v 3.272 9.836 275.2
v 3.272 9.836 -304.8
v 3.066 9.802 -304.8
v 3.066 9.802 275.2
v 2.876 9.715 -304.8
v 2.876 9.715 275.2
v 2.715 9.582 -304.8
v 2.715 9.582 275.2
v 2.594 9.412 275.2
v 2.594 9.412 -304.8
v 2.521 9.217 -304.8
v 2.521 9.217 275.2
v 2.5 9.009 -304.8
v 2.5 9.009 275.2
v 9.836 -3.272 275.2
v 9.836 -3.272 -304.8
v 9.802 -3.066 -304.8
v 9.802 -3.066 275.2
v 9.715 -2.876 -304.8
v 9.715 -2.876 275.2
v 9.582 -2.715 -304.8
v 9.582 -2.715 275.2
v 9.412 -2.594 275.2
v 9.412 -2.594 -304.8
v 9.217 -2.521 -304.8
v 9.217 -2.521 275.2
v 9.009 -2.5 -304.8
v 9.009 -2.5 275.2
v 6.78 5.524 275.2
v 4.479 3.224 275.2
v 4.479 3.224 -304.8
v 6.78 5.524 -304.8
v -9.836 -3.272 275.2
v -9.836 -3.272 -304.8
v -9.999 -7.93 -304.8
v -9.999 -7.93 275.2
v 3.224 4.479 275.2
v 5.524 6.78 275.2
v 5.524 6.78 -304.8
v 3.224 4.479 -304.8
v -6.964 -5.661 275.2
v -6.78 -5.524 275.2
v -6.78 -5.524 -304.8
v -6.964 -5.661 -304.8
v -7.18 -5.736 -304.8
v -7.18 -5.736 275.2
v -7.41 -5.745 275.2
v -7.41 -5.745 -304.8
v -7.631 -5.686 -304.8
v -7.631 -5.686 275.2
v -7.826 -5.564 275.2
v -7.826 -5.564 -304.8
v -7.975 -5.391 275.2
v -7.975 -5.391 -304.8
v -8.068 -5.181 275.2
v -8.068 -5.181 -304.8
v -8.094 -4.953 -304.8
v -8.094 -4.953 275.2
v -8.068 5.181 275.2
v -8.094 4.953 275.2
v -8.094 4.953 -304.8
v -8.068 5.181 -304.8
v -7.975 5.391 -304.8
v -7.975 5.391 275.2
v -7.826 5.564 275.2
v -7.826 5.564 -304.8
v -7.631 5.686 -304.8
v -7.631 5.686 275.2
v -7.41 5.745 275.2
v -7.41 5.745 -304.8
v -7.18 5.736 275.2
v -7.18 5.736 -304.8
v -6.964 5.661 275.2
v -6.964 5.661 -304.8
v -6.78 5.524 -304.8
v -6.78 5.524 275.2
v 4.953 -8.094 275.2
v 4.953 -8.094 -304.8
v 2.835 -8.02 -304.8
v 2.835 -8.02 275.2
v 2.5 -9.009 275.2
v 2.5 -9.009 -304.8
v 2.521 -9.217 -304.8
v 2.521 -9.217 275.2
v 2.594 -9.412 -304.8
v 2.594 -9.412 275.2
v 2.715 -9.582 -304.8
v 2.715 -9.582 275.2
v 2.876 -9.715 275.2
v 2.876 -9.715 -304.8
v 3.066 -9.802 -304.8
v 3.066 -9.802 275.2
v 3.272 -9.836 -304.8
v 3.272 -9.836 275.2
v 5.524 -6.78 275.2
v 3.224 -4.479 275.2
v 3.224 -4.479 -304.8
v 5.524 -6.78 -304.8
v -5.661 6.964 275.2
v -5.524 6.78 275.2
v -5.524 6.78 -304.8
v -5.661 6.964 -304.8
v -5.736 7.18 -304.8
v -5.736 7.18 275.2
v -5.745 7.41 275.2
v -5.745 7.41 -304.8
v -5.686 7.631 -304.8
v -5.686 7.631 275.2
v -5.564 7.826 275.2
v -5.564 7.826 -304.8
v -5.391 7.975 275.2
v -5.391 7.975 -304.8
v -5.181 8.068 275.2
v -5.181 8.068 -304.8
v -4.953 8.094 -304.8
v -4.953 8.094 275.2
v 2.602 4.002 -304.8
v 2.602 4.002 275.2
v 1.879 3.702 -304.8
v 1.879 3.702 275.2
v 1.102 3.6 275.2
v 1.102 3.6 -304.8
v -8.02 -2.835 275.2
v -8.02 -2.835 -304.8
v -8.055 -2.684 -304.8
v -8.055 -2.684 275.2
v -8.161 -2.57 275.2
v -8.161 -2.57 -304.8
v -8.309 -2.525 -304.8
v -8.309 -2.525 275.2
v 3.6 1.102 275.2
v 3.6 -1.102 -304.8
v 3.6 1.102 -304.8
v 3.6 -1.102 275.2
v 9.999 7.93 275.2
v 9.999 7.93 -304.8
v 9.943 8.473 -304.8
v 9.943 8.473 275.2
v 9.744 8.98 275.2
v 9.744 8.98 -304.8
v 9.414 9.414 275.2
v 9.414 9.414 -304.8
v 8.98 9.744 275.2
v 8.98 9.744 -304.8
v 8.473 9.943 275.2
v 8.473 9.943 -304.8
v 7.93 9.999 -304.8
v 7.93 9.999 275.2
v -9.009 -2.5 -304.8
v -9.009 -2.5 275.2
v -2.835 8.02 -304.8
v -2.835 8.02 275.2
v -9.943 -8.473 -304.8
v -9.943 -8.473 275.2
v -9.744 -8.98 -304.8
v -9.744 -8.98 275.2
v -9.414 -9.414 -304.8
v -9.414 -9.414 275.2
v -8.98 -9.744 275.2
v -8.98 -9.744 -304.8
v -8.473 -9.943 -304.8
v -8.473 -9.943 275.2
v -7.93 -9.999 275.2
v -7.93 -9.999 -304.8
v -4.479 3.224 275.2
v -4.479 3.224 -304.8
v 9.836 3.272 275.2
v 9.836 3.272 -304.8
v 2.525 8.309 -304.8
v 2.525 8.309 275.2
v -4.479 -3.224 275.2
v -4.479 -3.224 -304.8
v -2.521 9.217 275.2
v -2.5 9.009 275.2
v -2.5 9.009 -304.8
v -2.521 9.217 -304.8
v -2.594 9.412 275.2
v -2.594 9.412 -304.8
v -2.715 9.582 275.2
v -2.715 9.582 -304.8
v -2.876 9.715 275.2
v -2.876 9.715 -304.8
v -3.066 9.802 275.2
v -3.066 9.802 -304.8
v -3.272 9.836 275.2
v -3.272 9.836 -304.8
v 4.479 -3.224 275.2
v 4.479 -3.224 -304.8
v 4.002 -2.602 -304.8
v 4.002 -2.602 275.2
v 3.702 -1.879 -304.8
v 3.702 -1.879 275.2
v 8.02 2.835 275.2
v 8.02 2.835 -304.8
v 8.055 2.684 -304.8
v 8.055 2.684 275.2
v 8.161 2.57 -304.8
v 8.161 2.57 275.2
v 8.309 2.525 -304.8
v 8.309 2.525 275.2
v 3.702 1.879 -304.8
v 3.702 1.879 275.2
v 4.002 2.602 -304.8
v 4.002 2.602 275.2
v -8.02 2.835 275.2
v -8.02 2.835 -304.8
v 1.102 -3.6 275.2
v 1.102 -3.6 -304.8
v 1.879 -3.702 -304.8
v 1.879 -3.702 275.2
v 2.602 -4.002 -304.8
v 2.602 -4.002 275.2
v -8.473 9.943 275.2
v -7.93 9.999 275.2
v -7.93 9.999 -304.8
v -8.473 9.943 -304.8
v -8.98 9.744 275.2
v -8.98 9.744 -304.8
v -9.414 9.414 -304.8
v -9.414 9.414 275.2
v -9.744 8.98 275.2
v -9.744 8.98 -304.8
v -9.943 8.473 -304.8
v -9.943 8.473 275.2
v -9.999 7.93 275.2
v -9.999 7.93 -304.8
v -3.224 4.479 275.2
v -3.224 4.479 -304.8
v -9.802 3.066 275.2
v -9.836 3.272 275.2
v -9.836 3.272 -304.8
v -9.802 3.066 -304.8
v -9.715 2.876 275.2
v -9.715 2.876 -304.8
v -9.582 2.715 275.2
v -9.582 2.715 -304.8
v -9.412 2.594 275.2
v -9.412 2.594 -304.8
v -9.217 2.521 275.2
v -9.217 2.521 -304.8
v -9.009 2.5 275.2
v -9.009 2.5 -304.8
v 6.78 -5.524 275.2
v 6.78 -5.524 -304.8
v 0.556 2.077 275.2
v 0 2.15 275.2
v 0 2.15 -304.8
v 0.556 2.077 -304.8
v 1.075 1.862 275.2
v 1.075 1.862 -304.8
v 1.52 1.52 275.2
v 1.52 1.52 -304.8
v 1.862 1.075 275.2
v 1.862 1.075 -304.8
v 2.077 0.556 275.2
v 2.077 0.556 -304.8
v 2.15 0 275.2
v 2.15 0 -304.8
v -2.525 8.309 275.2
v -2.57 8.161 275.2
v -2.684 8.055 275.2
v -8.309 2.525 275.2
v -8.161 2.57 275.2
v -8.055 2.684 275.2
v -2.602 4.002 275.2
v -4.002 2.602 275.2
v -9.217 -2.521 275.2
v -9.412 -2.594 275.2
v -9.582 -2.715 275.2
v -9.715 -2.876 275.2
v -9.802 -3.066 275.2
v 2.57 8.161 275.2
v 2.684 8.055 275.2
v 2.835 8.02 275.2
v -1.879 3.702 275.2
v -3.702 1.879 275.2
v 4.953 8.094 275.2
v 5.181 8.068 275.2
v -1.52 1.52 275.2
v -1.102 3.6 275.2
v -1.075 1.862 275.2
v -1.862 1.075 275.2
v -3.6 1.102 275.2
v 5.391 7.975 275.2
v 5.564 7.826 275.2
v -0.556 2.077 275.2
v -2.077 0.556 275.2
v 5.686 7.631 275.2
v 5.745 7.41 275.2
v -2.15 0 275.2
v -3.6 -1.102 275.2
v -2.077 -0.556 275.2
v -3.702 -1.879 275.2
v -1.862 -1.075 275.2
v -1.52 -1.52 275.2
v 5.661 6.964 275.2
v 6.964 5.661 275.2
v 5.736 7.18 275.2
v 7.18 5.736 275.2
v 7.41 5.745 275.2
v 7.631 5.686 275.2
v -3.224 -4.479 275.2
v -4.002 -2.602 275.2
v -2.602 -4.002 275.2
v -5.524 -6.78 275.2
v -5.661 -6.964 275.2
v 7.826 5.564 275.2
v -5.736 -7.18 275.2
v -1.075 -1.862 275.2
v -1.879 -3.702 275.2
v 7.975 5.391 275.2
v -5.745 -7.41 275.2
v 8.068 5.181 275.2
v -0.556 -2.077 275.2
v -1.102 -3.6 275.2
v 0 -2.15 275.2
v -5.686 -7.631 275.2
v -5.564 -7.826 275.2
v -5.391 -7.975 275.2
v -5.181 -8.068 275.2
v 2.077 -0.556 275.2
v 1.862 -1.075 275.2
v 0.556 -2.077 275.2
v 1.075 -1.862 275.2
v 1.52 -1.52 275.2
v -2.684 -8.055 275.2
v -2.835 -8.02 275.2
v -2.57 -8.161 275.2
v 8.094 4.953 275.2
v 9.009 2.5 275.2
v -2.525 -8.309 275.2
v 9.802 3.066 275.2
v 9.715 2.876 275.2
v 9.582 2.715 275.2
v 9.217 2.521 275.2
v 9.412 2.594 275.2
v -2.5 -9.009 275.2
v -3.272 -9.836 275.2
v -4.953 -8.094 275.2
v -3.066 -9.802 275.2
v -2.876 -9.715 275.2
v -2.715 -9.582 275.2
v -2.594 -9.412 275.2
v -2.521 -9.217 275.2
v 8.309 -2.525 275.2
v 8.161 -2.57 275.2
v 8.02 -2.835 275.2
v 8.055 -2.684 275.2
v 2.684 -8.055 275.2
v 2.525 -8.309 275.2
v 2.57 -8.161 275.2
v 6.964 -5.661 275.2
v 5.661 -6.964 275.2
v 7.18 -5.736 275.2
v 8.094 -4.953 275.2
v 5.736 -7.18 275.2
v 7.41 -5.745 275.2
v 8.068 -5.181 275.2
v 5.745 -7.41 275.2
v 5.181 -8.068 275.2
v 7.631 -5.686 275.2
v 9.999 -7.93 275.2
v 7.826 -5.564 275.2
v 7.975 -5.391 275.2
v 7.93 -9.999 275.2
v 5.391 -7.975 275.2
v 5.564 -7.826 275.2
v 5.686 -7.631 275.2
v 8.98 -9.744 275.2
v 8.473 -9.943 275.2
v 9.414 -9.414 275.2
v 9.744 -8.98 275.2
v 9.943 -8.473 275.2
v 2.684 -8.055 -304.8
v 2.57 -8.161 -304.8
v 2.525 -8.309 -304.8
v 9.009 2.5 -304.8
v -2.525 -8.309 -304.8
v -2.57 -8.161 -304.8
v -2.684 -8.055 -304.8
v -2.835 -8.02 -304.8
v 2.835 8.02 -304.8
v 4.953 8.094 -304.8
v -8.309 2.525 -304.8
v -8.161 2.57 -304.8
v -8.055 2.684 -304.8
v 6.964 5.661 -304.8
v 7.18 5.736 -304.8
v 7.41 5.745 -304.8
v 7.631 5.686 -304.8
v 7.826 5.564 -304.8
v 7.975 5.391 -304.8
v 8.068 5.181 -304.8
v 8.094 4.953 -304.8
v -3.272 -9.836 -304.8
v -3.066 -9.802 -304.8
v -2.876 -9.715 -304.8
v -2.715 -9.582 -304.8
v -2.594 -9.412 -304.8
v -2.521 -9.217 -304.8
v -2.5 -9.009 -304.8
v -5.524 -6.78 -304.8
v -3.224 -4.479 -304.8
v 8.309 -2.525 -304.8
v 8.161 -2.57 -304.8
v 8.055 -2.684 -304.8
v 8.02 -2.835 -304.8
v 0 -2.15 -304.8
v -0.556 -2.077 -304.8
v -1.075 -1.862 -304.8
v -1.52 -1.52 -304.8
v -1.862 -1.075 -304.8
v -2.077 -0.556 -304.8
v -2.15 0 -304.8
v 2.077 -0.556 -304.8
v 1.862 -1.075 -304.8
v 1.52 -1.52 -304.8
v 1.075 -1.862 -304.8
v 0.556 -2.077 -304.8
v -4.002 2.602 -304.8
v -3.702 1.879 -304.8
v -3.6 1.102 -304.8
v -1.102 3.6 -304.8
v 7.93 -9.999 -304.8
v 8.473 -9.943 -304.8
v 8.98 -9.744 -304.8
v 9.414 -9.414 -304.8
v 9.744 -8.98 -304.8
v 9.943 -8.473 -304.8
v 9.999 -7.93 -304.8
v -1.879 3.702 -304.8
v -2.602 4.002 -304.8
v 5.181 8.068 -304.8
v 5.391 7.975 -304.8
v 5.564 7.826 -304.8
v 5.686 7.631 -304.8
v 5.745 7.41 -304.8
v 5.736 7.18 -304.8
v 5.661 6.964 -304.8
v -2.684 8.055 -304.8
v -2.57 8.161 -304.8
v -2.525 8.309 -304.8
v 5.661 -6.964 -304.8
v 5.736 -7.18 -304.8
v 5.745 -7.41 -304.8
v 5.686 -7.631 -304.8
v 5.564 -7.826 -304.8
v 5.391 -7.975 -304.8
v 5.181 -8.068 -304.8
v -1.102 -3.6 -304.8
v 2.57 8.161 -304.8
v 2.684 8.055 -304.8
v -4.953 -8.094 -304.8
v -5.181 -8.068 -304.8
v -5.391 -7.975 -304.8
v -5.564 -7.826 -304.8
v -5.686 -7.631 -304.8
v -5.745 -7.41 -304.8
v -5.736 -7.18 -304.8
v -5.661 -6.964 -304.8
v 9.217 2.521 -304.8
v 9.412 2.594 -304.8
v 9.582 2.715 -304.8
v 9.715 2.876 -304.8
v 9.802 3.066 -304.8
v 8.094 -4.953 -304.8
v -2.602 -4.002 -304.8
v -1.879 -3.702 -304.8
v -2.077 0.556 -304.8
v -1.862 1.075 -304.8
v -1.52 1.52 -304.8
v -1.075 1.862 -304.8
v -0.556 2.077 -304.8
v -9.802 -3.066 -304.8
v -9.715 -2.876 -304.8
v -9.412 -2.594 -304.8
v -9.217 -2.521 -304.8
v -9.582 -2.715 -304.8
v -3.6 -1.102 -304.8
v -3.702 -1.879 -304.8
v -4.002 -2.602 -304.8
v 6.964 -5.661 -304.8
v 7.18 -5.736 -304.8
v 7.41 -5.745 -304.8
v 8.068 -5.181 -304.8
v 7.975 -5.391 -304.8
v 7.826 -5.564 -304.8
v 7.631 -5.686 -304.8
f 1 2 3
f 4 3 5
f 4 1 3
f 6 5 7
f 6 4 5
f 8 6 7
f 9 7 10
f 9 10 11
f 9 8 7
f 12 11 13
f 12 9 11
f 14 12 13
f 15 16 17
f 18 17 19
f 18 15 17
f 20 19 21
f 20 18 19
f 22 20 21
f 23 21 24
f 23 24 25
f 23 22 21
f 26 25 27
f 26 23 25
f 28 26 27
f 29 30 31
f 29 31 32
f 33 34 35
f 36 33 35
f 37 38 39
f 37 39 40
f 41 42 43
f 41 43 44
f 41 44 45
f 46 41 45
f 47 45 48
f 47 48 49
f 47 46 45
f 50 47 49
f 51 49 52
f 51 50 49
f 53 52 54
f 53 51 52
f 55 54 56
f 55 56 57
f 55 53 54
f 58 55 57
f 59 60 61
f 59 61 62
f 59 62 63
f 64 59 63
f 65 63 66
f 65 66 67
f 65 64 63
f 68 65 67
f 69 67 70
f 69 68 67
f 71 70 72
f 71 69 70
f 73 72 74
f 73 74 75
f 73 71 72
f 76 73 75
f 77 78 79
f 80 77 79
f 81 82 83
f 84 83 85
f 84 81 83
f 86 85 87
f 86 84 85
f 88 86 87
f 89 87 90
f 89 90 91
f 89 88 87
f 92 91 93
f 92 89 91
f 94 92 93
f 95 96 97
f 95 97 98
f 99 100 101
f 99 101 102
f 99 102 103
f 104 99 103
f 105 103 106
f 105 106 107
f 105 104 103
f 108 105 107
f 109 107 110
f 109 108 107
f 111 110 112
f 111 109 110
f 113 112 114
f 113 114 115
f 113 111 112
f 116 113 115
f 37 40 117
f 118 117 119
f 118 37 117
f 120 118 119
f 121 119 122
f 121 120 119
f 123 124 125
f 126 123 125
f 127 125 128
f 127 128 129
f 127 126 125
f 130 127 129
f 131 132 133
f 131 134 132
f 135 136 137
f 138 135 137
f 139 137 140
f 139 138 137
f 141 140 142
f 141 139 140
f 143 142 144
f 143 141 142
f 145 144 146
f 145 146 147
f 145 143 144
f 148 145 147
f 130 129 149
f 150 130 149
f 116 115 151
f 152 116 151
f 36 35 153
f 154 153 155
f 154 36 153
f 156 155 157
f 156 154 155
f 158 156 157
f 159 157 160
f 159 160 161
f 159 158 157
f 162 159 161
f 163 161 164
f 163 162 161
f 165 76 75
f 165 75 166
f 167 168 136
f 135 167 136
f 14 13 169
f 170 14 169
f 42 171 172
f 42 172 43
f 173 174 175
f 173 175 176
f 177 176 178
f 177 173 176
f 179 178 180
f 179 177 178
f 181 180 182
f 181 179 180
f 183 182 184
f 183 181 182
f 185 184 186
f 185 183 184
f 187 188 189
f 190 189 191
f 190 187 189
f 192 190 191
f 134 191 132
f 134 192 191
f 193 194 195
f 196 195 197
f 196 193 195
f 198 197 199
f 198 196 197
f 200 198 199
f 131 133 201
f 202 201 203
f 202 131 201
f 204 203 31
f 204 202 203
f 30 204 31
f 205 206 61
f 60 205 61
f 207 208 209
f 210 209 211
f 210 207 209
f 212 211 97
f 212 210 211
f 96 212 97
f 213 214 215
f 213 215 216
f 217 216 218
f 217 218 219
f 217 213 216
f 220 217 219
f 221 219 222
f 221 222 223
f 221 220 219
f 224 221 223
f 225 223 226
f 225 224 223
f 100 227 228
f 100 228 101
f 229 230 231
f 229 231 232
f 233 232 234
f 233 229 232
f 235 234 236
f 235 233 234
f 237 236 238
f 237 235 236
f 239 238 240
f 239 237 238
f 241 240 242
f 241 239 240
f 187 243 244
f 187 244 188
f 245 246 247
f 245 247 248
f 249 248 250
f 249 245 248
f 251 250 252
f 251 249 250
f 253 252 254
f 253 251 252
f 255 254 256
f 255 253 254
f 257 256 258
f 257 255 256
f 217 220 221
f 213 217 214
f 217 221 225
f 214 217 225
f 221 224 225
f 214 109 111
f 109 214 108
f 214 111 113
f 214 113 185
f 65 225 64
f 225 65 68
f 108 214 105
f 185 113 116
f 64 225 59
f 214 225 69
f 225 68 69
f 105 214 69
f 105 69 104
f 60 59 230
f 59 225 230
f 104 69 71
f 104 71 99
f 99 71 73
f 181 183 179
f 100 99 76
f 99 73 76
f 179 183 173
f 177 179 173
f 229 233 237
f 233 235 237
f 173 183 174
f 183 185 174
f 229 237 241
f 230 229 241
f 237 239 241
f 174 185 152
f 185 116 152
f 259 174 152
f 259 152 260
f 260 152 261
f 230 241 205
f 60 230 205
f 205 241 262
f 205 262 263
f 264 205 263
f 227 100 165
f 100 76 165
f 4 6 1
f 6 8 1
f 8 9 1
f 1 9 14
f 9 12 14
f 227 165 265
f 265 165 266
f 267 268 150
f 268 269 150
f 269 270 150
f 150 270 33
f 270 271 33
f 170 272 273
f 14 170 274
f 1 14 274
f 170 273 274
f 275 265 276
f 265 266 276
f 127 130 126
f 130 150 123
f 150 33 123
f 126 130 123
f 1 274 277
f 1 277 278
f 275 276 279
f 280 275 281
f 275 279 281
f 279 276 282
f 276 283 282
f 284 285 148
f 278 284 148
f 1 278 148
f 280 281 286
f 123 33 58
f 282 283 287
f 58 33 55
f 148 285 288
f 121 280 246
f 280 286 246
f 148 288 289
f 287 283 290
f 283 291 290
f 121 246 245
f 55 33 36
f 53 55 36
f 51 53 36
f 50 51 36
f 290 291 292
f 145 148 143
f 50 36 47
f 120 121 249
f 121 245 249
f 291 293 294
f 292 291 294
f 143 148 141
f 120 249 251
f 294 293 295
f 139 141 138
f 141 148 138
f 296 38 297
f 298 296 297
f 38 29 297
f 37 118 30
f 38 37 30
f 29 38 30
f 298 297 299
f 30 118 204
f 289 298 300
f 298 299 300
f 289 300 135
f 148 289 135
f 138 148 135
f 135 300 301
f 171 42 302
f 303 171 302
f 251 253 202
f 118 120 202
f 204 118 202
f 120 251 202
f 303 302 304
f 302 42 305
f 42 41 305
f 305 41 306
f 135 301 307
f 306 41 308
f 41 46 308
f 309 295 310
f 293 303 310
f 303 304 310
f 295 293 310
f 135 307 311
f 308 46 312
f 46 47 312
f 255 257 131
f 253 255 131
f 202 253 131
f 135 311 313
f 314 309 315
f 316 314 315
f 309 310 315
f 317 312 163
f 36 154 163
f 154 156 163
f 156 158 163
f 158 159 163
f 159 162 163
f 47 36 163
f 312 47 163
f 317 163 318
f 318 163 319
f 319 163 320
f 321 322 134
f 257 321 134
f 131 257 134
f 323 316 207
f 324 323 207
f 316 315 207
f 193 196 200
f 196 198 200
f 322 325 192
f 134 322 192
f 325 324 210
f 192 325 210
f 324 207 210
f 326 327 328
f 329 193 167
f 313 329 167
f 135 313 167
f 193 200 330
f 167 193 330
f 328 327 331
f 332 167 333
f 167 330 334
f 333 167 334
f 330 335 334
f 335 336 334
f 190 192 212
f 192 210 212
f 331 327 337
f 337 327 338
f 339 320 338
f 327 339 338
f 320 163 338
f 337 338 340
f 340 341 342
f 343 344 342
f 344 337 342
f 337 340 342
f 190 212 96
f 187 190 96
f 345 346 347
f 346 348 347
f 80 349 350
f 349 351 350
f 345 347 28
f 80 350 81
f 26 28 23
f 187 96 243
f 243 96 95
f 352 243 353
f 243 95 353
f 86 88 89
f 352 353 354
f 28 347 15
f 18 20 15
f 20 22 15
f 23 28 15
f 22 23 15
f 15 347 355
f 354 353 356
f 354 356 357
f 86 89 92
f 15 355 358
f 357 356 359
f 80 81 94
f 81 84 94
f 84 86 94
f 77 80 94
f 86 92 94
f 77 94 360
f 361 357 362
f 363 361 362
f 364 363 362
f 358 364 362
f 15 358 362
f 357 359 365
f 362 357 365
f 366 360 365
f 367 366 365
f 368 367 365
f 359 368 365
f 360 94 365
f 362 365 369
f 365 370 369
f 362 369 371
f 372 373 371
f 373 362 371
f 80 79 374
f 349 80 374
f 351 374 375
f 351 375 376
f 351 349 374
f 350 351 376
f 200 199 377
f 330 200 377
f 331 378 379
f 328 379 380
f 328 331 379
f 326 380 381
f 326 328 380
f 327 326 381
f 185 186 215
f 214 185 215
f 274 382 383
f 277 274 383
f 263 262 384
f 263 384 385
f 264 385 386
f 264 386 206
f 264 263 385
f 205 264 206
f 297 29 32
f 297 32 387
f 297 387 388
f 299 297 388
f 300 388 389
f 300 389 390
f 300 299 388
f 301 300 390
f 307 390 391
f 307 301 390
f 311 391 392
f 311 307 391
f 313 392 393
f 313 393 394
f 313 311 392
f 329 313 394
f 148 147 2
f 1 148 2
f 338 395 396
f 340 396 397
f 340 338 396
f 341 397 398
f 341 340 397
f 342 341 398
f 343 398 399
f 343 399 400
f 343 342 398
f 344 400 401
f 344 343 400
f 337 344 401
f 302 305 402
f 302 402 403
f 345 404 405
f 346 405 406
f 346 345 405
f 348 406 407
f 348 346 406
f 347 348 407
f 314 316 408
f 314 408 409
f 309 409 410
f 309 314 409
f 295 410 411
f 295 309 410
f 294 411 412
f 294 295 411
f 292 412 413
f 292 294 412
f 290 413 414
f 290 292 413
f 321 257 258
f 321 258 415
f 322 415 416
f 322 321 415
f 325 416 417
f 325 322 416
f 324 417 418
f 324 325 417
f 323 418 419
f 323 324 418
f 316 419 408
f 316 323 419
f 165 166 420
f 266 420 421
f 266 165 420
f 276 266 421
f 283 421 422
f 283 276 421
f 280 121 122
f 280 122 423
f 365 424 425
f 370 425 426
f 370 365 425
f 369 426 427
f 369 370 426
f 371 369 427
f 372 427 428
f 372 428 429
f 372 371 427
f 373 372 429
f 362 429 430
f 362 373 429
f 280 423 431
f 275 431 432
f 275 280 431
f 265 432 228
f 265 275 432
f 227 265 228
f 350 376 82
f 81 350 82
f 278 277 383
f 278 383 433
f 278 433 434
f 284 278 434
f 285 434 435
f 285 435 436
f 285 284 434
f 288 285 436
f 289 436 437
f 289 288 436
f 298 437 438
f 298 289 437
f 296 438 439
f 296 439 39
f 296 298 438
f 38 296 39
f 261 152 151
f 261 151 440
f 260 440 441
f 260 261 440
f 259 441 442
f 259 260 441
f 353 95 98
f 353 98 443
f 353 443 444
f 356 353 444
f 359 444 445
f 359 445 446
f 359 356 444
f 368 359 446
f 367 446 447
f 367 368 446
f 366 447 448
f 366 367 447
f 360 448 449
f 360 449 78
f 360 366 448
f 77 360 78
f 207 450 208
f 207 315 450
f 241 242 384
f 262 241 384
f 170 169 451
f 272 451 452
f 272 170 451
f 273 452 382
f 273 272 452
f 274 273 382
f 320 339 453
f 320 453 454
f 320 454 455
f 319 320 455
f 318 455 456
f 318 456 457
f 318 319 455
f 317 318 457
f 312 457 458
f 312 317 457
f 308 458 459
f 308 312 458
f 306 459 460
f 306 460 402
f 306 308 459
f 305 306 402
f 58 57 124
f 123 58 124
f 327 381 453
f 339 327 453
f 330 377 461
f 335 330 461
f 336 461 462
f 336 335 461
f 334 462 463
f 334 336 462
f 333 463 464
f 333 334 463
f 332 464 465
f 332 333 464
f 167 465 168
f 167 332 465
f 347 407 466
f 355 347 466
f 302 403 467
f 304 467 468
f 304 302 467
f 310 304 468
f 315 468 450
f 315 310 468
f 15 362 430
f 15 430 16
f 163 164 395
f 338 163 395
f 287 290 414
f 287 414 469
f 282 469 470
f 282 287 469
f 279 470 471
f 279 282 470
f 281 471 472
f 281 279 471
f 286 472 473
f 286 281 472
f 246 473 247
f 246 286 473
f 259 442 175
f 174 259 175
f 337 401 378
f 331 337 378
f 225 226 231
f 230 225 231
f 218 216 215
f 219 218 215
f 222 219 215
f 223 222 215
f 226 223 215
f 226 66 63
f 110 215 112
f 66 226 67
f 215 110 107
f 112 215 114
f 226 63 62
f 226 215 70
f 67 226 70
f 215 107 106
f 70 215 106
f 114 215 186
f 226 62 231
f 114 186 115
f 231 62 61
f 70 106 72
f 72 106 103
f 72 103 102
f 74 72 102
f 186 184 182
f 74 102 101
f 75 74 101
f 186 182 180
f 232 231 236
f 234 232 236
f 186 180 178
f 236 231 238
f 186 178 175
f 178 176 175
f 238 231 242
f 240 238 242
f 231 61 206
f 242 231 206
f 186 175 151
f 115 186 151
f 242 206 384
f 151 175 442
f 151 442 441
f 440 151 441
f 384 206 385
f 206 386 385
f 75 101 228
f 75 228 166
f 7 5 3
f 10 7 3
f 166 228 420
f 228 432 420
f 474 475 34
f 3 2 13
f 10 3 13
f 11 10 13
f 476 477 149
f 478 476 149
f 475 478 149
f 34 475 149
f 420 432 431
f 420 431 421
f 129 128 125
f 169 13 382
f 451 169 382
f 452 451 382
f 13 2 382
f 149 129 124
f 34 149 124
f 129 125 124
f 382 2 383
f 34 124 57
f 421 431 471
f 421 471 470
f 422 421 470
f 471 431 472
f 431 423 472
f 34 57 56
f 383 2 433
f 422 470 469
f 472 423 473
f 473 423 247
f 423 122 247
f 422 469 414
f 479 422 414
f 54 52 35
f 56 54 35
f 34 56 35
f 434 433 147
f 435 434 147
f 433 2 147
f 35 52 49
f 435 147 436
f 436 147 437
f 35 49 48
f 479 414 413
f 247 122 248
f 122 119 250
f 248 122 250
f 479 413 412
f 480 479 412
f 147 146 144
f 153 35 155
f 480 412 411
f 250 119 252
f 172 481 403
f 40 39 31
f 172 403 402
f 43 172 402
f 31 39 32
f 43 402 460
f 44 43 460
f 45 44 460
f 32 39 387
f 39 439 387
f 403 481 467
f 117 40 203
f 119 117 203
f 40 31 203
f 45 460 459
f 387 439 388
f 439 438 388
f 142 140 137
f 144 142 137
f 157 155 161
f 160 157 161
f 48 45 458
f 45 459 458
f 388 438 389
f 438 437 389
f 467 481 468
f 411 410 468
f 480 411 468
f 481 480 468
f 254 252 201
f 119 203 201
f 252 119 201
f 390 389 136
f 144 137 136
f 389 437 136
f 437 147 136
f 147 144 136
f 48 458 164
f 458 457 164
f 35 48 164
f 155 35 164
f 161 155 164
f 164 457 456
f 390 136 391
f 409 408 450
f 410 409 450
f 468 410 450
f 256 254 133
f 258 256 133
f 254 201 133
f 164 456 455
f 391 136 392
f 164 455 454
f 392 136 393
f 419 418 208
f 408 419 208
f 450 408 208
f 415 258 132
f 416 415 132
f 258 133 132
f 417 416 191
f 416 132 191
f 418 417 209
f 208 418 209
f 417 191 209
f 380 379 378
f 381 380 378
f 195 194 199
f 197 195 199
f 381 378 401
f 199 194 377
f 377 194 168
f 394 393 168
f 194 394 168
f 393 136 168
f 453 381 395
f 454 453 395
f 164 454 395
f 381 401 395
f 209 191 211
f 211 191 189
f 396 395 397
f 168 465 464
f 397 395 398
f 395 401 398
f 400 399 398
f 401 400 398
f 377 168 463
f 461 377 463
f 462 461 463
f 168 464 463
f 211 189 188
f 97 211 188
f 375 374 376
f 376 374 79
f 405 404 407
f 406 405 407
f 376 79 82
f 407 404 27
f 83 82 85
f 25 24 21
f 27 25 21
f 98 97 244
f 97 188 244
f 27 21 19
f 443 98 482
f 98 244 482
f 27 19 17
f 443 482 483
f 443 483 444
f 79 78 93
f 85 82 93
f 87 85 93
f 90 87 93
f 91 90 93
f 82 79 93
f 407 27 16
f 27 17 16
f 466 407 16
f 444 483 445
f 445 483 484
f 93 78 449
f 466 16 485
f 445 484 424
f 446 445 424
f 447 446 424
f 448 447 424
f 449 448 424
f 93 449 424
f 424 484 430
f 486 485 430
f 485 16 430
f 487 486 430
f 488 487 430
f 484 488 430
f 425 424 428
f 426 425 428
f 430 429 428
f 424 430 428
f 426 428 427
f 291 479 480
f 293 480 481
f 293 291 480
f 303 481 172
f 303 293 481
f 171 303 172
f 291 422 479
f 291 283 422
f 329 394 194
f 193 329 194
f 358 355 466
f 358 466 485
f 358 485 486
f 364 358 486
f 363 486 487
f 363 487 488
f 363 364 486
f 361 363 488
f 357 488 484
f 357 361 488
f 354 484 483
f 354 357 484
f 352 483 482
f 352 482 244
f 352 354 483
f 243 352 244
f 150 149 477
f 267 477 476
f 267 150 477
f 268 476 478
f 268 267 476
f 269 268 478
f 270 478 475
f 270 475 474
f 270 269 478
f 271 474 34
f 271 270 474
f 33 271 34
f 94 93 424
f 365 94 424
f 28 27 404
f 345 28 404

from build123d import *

# Parameters (mm, degrees)
BOSS_EXTRUDE1_DEPTH     = 304.8
CIRPATTERN1_COUNT       = 4
CUT_EXTRUDE1_DEPTH      = 306.611552742
CUT_EXTRUDE1_DEPTH_BACK = 306.611552742
SKETCH4_W               = 20.616616654
SKETCH4_H               = 34.076220988


with BuildPart() as part:
    # Sketch3 → Boss-Extrude1 (new, symmetric)
    with BuildSketch(Plane.XY):
        with BuildLine():
            Line((-2.524916986, 8.30911066), (-2.500487338, 9.008684239))
            ThreePointArc((-2.500487338, 9.008684239), (-2.714917039, 9.582202525), (-3.272080403, 9.836116498))
            Line((-3.272080403, 9.836116498), (-7.930201007, 9.998781654))
            ThreePointArc((-7.930201007, 9.998781654), (-9.414213562, 9.414213562), (-9.998781654, 7.930201007))
            Line((-9.998781654, 7.930201007), (-9.836116498, 3.272080403))
            ThreePointArc((-9.836116498, 3.272080403), (-9.582202525, 2.714917039), (-9.008684239, 2.500487338))
            Line((-9.008684239, 2.500487338), (-8.30911066, 2.524916986))
            ThreePointArc((-8.30911066, 2.524916986), (-8.100174399, 2.620134726), (-8.019763261, 2.835204083))
            Line((-8.019763261, 2.835204083), (-8.093719461, 4.953032548))
            ThreePointArc((-8.093719461, 4.953032548), (-7.631170264, 5.686128657), (-6.779559917, 5.52444538))
            Line((-6.779559917, 5.52444538), (-4.478679656, 3.22356512))
            ThreePointArc((-4.478679656, 3.22356512), (-3.828361402, 2.250295073), (-3.6, 1.102244776))
            Line((-3.6, 1.102244776), (-3.6, 0))
            Line((-3.6, 0), (-2.15, 0))
            ThreePointArc((-2.15, 0), (-1.52027958, 1.52027958), (0, 2.15))
            Line((0, 2.15), (0, 3.6))
            Line((0, 3.6), (-1.102244776, 3.6))
            ThreePointArc((-1.102244776, 3.6), (-2.250295073, 3.828361402), (-3.22356512, 4.478679656))
            Line((-3.22356512, 4.478679656), (-5.52444538, 6.779559917))
            ThreePointArc((-5.52444538, 6.779559917), (-5.686128657, 7.631170264), (-4.953032548, 8.093719461))
            Line((-4.953032548, 8.093719461), (-2.835204083, 8.019763261))
            ThreePointArc((-2.835204083, 8.019763261), (-2.620134726, 8.100174399), (-2.524916986, 8.30911066))
        make_face()
    boss_extrude1 = extrude(amount=BOSS_EXTRUDE1_DEPTH, both=True)

    # CirPattern1: Boss-Extrude1 ×4 about axis
    cirpattern1_axis = Axis((0, 0, 0), (0, 0, 1))
    for i in range(1, CIRPATTERN1_COUNT):
        add(boss_extrude1.rotate(cirpattern1_axis, i * 360 / CIRPATTERN1_COUNT))

    # Sketch4 → Cut-Extrude1 (cut, two sides: drawn at the far end of the back side and taken through both)
    with BuildSketch(Plane(origin=(0.339081089, 9.71001196, 0), x_dir=(0.9993908270190978, -0.034899496702443626, 0), z_dir=(0.034899496702443626, 0.9993908270190978, 0)).offset(-CUT_EXTRUDE1_DEPTH_BACK)):
        with Locations((-0.00156471, -292.238110494)):
            Rectangle(SKETCH4_W, SKETCH4_H)
    extrude(amount=CUT_EXTRUDE1_DEPTH + CUT_EXTRUDE1_DEPTH_BACK, mode=Mode.SUBTRACT)


solid = part.part
